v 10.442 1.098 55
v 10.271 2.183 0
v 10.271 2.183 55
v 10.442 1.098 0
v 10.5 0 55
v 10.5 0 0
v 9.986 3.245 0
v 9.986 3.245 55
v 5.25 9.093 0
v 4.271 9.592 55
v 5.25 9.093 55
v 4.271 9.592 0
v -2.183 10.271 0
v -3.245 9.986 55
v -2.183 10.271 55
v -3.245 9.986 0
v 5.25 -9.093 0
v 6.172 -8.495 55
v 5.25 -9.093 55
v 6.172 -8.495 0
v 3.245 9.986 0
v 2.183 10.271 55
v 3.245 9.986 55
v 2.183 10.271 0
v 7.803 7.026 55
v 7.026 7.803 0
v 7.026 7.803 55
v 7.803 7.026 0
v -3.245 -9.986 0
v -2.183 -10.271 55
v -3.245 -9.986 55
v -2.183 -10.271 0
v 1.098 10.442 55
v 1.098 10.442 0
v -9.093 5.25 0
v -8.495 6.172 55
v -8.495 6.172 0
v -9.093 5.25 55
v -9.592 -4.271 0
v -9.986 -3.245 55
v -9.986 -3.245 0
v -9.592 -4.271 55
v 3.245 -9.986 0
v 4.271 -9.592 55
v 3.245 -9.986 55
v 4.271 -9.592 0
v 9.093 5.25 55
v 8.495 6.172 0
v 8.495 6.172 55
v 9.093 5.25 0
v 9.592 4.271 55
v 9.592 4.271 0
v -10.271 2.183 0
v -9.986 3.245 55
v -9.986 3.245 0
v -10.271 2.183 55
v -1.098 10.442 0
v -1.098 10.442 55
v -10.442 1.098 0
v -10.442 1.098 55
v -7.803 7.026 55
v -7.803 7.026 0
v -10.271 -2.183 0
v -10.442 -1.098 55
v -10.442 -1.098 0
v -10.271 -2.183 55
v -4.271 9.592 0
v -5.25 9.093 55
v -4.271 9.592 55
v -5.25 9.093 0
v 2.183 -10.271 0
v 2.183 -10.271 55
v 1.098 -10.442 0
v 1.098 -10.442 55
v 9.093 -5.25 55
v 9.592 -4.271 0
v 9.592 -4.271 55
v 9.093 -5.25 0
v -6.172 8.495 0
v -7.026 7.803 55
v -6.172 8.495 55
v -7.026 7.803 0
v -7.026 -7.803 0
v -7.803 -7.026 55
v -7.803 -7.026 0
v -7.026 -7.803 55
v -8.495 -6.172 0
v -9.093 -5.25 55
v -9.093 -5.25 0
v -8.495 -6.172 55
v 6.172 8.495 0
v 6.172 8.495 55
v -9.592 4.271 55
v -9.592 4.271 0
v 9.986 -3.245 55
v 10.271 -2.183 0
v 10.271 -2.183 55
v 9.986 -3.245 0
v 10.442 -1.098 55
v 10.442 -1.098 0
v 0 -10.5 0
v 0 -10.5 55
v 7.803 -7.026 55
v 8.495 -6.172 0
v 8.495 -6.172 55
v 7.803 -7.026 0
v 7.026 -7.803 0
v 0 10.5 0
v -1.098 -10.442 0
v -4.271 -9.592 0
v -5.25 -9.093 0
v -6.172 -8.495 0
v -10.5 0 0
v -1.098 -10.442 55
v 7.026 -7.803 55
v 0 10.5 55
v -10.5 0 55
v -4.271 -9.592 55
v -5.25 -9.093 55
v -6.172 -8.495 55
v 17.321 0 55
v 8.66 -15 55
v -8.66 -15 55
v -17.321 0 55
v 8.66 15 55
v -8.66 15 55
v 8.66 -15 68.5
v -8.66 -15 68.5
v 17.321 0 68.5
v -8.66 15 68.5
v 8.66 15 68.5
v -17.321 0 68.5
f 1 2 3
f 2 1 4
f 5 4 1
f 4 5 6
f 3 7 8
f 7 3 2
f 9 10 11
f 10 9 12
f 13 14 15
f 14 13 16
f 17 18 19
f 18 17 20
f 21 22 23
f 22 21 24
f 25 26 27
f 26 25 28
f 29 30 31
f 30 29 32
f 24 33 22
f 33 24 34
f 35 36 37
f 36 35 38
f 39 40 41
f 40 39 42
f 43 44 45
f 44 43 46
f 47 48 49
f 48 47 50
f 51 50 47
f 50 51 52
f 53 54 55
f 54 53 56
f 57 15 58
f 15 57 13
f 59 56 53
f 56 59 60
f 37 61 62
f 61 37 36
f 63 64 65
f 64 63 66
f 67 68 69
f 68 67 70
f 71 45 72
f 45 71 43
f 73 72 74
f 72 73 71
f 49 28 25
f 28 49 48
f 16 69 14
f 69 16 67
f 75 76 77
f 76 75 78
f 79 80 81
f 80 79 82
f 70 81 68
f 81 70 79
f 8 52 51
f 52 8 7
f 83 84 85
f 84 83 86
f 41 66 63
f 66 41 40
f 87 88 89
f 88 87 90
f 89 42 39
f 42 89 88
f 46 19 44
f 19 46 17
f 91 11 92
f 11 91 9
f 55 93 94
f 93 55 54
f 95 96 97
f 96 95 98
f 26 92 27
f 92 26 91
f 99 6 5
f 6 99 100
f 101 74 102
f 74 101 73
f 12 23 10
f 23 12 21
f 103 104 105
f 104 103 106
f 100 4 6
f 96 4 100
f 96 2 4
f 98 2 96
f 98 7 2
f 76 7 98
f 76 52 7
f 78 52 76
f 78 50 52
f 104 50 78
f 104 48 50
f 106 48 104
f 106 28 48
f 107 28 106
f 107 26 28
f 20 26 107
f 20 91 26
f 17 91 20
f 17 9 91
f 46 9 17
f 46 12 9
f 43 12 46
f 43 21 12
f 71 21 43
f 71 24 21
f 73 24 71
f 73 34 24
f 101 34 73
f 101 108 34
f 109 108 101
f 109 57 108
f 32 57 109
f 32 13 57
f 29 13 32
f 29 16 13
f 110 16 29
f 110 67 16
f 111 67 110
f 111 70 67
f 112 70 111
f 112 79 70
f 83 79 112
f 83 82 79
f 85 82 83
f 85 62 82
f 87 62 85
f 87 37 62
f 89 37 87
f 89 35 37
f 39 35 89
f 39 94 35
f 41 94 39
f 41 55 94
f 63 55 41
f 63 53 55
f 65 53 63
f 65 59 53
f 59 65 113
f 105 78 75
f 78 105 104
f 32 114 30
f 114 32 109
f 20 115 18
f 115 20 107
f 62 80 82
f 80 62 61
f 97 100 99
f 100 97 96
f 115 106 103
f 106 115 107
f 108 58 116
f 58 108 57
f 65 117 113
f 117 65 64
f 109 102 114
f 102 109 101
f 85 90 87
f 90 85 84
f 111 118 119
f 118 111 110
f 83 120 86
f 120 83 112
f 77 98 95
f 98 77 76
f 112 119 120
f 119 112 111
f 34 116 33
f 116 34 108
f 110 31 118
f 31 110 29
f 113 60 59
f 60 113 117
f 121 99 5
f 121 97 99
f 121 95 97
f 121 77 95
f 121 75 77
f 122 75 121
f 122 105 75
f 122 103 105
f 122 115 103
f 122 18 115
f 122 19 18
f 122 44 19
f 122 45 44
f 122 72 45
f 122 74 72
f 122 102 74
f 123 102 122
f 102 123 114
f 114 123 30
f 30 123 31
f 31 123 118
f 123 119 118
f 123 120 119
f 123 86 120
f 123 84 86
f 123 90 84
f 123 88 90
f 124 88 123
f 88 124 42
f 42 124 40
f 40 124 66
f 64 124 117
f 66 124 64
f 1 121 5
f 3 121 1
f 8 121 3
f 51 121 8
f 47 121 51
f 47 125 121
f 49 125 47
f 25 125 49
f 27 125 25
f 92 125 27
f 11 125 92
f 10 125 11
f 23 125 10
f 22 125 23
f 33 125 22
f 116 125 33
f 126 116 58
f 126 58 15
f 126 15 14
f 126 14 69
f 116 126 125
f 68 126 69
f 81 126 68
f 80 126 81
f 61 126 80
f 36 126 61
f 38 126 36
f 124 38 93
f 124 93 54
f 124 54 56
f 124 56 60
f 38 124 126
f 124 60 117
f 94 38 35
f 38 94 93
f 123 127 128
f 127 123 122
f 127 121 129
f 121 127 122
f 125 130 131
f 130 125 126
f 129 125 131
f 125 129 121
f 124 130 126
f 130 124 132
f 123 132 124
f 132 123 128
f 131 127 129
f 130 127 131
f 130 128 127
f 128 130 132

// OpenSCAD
// Hex-head bolt.
$fn = 60;
eps = 0.02;
thread_d = 21;
flat = 30;
shaft_l = 55;
union() { cylinder(d=thread_d,h=shaft_l); translate([0,0,shaft_l]) cylinder(d=flat/cos(30),h=flat*0.45,$fn=6); }
